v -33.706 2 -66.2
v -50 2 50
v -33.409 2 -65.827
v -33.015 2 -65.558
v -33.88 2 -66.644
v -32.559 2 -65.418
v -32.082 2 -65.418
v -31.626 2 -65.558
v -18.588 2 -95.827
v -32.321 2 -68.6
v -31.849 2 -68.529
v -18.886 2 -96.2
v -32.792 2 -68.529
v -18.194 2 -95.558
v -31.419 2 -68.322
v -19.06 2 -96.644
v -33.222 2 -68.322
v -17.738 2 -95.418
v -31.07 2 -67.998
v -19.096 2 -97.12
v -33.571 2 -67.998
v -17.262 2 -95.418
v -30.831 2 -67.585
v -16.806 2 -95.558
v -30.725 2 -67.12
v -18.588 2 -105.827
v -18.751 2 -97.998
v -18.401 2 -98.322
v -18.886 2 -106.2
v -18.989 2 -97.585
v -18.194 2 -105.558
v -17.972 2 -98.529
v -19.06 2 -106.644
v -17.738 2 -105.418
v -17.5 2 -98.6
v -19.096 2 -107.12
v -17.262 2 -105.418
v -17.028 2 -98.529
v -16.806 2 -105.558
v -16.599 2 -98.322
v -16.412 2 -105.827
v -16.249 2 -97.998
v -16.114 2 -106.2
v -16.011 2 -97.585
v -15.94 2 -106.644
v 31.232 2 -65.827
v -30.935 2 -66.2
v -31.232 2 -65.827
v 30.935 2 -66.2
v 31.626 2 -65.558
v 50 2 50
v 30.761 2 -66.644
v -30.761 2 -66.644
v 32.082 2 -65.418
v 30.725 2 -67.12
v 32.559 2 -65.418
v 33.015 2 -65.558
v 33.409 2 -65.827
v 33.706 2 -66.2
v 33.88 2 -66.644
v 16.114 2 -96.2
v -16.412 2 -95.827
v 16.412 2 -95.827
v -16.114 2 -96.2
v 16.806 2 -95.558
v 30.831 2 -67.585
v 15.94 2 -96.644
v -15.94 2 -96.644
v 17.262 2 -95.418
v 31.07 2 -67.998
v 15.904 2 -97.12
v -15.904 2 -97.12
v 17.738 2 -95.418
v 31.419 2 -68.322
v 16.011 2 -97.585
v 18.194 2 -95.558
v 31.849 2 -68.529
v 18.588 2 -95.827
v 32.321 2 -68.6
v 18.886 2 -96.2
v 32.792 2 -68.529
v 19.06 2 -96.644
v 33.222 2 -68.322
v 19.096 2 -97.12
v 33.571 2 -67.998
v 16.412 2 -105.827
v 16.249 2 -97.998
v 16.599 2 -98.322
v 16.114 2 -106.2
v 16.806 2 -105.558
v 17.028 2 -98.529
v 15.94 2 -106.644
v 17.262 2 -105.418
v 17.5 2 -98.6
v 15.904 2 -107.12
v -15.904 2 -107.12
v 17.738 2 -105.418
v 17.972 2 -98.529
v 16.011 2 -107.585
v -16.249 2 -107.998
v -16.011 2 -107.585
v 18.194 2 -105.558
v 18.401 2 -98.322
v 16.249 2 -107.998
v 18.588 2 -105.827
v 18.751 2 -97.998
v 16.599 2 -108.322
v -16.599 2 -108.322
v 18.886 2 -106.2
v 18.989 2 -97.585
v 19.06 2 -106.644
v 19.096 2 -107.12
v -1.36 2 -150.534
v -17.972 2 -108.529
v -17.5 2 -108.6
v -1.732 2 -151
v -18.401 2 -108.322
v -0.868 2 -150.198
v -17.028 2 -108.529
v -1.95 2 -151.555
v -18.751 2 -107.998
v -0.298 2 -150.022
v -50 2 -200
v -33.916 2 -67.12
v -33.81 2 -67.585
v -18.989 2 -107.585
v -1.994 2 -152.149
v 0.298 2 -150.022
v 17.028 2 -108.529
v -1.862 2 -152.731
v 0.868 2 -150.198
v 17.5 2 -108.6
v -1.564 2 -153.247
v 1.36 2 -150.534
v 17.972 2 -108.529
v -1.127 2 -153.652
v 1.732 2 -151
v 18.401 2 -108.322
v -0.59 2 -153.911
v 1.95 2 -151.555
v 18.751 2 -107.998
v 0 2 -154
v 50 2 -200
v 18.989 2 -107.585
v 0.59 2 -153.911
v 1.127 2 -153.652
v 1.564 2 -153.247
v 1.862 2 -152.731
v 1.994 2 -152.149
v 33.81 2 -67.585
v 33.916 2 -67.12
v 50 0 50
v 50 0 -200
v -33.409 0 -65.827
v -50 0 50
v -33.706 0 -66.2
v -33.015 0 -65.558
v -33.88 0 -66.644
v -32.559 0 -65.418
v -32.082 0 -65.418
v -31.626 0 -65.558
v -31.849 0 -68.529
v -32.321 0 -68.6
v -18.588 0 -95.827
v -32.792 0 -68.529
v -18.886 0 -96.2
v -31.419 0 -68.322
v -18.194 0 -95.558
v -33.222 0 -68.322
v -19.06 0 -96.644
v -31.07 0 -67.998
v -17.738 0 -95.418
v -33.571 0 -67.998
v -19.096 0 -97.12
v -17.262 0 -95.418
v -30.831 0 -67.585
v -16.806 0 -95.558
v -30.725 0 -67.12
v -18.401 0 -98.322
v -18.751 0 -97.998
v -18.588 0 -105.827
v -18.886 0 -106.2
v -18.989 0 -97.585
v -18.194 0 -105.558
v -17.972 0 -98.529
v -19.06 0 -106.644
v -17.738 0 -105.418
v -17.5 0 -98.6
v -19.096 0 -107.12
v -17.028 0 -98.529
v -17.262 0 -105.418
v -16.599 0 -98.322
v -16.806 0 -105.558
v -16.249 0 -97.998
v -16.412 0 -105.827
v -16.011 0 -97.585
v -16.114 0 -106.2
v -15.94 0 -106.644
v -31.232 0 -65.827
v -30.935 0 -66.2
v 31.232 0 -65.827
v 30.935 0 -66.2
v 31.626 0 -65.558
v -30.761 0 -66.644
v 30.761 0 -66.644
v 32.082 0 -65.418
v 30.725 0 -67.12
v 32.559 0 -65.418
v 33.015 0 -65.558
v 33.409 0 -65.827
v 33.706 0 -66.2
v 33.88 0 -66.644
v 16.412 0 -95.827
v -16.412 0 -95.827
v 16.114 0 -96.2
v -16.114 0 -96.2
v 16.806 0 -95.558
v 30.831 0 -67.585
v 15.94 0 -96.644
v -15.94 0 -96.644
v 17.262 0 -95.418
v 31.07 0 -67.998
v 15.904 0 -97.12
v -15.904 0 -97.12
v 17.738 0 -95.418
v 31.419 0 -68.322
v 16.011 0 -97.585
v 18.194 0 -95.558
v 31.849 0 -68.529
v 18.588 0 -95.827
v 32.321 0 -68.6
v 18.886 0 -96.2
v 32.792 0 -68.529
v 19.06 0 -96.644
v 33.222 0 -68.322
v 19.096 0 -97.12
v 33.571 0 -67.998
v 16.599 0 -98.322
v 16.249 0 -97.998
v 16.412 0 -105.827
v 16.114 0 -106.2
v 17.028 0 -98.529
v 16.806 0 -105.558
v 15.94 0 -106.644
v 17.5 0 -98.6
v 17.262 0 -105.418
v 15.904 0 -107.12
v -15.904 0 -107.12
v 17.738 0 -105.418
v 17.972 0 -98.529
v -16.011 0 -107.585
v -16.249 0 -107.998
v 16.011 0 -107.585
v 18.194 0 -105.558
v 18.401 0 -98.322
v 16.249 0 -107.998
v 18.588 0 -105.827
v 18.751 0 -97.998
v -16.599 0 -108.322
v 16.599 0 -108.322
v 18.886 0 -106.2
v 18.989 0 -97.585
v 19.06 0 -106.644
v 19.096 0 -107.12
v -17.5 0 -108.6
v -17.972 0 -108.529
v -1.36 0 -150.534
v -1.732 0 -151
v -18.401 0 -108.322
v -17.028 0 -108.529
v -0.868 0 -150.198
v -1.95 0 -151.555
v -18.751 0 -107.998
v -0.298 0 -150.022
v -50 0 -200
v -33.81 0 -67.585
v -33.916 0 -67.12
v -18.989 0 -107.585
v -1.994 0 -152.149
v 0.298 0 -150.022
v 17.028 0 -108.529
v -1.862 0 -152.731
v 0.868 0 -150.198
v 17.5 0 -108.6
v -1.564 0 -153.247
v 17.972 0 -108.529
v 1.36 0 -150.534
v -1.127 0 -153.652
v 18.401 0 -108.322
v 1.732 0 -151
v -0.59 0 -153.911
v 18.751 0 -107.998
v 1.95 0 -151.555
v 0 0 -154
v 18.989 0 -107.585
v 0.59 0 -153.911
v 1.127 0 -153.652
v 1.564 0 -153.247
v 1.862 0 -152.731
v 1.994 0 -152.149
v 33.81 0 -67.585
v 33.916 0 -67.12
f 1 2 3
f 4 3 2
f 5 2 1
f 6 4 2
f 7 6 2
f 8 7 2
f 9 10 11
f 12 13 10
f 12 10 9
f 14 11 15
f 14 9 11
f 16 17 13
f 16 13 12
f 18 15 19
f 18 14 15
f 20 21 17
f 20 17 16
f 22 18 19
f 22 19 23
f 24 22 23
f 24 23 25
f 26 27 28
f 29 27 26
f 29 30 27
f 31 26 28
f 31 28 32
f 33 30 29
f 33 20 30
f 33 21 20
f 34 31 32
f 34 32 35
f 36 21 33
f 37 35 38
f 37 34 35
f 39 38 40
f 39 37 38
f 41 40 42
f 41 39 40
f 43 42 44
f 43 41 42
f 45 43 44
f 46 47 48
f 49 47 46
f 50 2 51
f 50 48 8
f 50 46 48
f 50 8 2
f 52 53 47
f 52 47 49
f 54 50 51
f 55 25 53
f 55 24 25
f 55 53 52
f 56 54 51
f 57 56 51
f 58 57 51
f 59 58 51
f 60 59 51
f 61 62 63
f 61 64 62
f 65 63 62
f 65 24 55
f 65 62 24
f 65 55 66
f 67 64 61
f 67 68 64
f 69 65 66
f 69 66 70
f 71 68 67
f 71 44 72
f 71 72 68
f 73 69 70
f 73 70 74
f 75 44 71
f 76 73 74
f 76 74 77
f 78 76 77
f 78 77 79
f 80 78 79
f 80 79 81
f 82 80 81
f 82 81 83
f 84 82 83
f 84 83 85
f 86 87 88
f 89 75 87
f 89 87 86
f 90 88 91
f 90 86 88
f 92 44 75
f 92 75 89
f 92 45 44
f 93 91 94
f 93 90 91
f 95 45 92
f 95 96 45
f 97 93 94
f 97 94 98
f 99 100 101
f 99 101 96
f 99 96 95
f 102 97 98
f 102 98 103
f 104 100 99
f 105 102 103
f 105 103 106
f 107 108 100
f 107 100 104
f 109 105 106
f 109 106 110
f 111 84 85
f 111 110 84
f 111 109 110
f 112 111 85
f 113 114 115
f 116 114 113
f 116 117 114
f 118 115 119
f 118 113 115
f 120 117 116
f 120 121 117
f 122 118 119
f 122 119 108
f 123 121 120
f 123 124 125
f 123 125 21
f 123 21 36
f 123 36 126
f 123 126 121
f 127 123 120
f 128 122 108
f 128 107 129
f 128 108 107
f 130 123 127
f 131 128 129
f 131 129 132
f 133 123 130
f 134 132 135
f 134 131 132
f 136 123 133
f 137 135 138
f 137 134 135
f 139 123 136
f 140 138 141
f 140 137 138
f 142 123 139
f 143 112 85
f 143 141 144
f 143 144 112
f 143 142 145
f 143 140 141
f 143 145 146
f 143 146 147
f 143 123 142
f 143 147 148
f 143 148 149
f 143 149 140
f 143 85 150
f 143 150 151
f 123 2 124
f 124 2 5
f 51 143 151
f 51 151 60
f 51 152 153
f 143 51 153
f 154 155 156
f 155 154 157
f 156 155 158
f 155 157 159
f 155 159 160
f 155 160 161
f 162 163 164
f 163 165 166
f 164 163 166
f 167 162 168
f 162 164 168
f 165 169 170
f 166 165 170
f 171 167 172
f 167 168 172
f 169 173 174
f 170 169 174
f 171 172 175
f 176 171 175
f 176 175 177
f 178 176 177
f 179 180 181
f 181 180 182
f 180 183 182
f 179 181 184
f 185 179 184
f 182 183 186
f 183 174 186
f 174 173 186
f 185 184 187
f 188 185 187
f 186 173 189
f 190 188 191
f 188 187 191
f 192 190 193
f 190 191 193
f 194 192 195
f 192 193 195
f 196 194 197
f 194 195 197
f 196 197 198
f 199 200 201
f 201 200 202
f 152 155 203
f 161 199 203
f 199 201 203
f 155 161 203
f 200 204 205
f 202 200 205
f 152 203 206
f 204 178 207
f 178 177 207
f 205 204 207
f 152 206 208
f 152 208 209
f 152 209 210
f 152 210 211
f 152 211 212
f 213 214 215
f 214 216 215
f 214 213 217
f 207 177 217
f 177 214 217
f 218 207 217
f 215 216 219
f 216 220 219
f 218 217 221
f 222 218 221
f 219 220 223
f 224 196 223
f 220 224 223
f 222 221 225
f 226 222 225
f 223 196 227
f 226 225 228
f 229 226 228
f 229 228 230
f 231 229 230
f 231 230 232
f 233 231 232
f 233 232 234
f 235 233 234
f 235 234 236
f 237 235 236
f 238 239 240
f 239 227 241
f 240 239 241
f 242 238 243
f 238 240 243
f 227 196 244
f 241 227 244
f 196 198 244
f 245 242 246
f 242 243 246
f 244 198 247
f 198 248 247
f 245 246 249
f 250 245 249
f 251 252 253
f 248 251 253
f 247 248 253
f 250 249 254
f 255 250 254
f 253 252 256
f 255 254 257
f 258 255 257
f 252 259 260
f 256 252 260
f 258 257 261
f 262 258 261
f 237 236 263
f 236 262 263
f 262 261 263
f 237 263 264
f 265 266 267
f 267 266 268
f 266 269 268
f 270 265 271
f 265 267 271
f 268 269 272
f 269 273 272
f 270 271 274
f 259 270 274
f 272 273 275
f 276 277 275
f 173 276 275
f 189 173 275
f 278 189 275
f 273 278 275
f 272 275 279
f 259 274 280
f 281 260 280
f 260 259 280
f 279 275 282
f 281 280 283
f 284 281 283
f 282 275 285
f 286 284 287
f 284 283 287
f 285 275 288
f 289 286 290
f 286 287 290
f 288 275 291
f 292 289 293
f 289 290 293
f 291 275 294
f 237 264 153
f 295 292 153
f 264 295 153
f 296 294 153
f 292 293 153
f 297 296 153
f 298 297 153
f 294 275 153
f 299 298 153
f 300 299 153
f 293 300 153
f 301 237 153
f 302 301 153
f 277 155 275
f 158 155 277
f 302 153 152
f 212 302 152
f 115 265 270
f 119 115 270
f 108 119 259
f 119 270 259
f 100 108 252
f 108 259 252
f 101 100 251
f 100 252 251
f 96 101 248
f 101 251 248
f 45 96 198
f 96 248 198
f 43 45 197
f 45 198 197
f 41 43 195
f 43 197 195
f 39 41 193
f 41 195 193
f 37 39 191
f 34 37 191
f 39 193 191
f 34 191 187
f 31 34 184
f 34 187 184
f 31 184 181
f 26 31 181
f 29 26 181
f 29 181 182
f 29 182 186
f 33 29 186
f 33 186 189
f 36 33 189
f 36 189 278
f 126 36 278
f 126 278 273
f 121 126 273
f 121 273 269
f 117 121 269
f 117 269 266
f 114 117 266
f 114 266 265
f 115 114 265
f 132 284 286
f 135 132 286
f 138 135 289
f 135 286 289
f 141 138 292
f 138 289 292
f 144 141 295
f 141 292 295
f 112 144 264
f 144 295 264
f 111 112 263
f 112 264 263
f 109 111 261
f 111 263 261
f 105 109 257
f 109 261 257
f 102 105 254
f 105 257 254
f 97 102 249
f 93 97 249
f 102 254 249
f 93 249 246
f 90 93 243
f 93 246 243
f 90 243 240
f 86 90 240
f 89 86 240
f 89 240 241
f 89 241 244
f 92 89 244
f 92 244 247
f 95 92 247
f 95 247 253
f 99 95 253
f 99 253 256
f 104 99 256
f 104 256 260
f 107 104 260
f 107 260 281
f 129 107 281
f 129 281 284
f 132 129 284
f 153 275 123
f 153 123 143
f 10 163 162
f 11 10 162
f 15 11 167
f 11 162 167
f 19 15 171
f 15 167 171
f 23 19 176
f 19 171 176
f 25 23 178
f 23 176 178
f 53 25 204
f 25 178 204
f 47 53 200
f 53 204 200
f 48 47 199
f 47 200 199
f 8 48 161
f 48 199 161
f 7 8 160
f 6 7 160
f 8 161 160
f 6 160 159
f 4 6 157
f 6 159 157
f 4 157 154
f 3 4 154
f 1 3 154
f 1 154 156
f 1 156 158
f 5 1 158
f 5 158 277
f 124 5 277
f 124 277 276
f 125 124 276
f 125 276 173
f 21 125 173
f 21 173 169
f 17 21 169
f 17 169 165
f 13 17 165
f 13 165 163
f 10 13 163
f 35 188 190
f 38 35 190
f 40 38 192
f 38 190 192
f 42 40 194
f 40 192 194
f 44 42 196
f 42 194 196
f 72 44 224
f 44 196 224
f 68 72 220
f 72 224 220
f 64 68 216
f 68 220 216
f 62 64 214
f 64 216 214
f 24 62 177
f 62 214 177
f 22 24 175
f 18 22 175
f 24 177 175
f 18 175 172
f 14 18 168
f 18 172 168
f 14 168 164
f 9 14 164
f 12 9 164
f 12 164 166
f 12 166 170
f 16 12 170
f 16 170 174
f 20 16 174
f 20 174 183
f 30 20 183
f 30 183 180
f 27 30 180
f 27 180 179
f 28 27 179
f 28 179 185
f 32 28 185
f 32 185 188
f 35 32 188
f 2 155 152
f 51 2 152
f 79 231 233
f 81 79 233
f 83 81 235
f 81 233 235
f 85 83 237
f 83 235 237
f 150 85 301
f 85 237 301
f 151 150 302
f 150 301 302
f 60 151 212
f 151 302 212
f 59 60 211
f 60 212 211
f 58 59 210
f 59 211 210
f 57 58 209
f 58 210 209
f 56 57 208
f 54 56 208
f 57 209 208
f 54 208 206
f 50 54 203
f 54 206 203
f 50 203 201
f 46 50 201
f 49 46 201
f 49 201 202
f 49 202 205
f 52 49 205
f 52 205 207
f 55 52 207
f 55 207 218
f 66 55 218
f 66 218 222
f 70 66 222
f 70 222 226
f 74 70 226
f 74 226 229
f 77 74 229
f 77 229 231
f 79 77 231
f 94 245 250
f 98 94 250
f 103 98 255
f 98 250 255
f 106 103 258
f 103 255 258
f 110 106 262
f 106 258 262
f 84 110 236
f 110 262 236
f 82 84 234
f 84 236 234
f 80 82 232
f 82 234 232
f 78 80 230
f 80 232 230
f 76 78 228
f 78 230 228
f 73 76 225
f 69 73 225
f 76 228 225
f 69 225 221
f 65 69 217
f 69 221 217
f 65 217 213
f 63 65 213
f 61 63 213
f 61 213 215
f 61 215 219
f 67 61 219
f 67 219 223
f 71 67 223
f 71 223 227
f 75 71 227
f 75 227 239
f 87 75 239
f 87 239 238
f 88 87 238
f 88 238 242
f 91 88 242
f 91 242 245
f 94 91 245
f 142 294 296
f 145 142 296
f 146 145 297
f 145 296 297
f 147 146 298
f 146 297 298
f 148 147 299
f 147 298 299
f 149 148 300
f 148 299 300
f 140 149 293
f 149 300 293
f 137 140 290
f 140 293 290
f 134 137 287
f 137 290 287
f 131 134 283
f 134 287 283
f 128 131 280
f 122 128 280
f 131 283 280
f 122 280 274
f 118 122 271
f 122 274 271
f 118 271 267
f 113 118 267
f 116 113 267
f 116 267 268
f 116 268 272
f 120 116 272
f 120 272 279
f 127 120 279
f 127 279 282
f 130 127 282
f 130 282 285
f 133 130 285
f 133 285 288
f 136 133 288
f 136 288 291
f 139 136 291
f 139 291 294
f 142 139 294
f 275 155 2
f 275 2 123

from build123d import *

# Parameters (mm, degrees)
SKETCH_1_W          = 100
SKETCH_1_H          = 400
EXTRUDE_1_DEPTH     = 2
CUT_EXTRUDE_2_REACH = 208.165
SKETCH_3_R          = 2
CUT_EXTRUDE_3_REACH = 208.165
SKETCH_4_R          = 1.6
CUT_EXTRUDE_4_REACH = 208.165
SKETCH_5_W          = 100
SKETCH_5_H          = 150


with BuildPart() as part:
    # 草图1 → 凸台-拉伸1 (new body)
    with BuildSketch(Plane(origin=(0, 0, 0), x_dir=(1, 0, 0), z_dir=(0, 1, 0))):
        Rectangle(SKETCH_1_W, SKETCH_1_H)
    extrude(amount=EXTRUDE_1_DEPTH)

    # 草图3 → 切除-拉伸2 (cut, up to next)
    with BuildSketch(Plane.XZ, mode=Mode.PRIVATE) as cut_extrude_2_sk1:
        with Locations(Location((0, -152, 0), (0, 0, 270))):
            Circle(SKETCH_3_R)
    cut_extrude_2_tool1 = extrude(cut_extrude_2_sk1.sketch, amount=-CUT_EXTRUDE_2_REACH, mode=Mode.PRIVATE) & part.part
    add(cut_extrude_2_tool1.solids().sort_by_distance((0, 0, -152))[0], mode=Mode.SUBTRACT)

    # 草图4 → 切除-拉伸3 (cut, up to next)
    with BuildSketch(Plane.XZ, mode=Mode.PRIVATE) as cut_extrude_3_sk1:
        with Locations(Location((17.5, -97, 0), (0, 0, 270))):
            Circle(SKETCH_4_R)
    cut_extrude_3_tool1 = extrude(cut_extrude_3_sk1.sketch, amount=-CUT_EXTRUDE_3_REACH, mode=Mode.PRIVATE) & part.part
    # 草图4 → 切除-拉伸3 (cut, up to next)
    with BuildSketch(Plane.XZ, mode=Mode.PRIVATE) as cut_extrude_3_sk2:
        with Locations(Location((17.5, -107, 0), (0, 0, 270))):
            Circle(SKETCH_4_R)
    cut_extrude_3_tool2 = extrude(cut_extrude_3_sk2.sketch, amount=-CUT_EXTRUDE_3_REACH, mode=Mode.PRIVATE) & part.part
    # 草图4 → 切除-拉伸3 (cut, up to next)
    with BuildSketch(Plane.XZ, mode=Mode.PRIVATE) as cut_extrude_3_sk3:
        with Locations(Location((32.32051615, -67, 0), (0, 0, 270))):
            Circle(SKETCH_4_R)
    cut_extrude_3_tool3 = extrude(cut_extrude_3_sk3.sketch, amount=-CUT_EXTRUDE_3_REACH, mode=Mode.PRIVATE) & part.part
    # 草图4 → 切除-拉伸3 (cut, up to next)
    with BuildSketch(Plane.XZ, mode=Mode.PRIVATE) as cut_extrude_3_sk4:
        with Locations(Location((-17.5, -97, 0), (0, 0, 270))):
            Circle(SKETCH_4_R)
    cut_extrude_3_tool4 = extrude(cut_extrude_3_sk4.sketch, amount=-CUT_EXTRUDE_3_REACH, mode=Mode.PRIVATE) & part.part
    # 草图4 → 切除-拉伸3 (cut, up to next)
    with BuildSketch(Plane.XZ, mode=Mode.PRIVATE) as cut_extrude_3_sk5:
        with Locations(Location((-17.5, -107, 0), (0, 0, 270))):
            Circle(SKETCH_4_R)
    cut_extrude_3_tool5 = extrude(cut_extrude_3_sk5.sketch, amount=-CUT_EXTRUDE_3_REACH, mode=Mode.PRIVATE) & part.part
    # 草图4 → 切除-拉伸3 (cut, up to next)
    with BuildSketch(Plane.XZ, mode=Mode.PRIVATE) as cut_extrude_3_sk6:
        with Locations(Location((-32.32051615, -67, 0), (0, 0, 270))):
            Circle(SKETCH_4_R)
    cut_extrude_3_tool6 = extrude(cut_extrude_3_sk6.sketch, amount=-CUT_EXTRUDE_3_REACH, mode=Mode.PRIVATE) & part.part
    add(cut_extrude_3_tool1.solids().sort_by_distance((17.5, 0, -97))[0], mode=Mode.SUBTRACT)
    add(cut_extrude_3_tool2.solids().sort_by_distance((17.5, 0, -107))[0], mode=Mode.SUBTRACT)
    add(cut_extrude_3_tool3.solids().sort_by_distance((32.320516, 0, -67))[0], mode=Mode.SUBTRACT)
    add(cut_extrude_3_tool4.solids().sort_by_distance((-17.5, 0, -97))[0], mode=Mode.SUBTRACT)
    add(cut_extrude_3_tool5.solids().sort_by_distance((-17.5, 0, -107))[0], mode=Mode.SUBTRACT)
    add(cut_extrude_3_tool6.solids().sort_by_distance((-32.320516, 0, -67))[0], mode=Mode.SUBTRACT)

    # 草图5 → 切除-拉伸4 (cut, up to next)
    with BuildSketch(Plane.XZ, mode=Mode.PRIVATE) as cut_extrude_4_sk1:
        with Locations((0, 125)):
            Rectangle(SKETCH_5_W, SKETCH_5_H)
    cut_extrude_4_tool1 = extrude(cut_extrude_4_sk1.sketch, amount=-CUT_EXTRUDE_4_REACH, mode=Mode.PRIVATE) & part.part
    add(cut_extrude_4_tool1.solids().sort_by_distance((0, 0, 125))[0], mode=Mode.SUBTRACT)


solid = part.part
